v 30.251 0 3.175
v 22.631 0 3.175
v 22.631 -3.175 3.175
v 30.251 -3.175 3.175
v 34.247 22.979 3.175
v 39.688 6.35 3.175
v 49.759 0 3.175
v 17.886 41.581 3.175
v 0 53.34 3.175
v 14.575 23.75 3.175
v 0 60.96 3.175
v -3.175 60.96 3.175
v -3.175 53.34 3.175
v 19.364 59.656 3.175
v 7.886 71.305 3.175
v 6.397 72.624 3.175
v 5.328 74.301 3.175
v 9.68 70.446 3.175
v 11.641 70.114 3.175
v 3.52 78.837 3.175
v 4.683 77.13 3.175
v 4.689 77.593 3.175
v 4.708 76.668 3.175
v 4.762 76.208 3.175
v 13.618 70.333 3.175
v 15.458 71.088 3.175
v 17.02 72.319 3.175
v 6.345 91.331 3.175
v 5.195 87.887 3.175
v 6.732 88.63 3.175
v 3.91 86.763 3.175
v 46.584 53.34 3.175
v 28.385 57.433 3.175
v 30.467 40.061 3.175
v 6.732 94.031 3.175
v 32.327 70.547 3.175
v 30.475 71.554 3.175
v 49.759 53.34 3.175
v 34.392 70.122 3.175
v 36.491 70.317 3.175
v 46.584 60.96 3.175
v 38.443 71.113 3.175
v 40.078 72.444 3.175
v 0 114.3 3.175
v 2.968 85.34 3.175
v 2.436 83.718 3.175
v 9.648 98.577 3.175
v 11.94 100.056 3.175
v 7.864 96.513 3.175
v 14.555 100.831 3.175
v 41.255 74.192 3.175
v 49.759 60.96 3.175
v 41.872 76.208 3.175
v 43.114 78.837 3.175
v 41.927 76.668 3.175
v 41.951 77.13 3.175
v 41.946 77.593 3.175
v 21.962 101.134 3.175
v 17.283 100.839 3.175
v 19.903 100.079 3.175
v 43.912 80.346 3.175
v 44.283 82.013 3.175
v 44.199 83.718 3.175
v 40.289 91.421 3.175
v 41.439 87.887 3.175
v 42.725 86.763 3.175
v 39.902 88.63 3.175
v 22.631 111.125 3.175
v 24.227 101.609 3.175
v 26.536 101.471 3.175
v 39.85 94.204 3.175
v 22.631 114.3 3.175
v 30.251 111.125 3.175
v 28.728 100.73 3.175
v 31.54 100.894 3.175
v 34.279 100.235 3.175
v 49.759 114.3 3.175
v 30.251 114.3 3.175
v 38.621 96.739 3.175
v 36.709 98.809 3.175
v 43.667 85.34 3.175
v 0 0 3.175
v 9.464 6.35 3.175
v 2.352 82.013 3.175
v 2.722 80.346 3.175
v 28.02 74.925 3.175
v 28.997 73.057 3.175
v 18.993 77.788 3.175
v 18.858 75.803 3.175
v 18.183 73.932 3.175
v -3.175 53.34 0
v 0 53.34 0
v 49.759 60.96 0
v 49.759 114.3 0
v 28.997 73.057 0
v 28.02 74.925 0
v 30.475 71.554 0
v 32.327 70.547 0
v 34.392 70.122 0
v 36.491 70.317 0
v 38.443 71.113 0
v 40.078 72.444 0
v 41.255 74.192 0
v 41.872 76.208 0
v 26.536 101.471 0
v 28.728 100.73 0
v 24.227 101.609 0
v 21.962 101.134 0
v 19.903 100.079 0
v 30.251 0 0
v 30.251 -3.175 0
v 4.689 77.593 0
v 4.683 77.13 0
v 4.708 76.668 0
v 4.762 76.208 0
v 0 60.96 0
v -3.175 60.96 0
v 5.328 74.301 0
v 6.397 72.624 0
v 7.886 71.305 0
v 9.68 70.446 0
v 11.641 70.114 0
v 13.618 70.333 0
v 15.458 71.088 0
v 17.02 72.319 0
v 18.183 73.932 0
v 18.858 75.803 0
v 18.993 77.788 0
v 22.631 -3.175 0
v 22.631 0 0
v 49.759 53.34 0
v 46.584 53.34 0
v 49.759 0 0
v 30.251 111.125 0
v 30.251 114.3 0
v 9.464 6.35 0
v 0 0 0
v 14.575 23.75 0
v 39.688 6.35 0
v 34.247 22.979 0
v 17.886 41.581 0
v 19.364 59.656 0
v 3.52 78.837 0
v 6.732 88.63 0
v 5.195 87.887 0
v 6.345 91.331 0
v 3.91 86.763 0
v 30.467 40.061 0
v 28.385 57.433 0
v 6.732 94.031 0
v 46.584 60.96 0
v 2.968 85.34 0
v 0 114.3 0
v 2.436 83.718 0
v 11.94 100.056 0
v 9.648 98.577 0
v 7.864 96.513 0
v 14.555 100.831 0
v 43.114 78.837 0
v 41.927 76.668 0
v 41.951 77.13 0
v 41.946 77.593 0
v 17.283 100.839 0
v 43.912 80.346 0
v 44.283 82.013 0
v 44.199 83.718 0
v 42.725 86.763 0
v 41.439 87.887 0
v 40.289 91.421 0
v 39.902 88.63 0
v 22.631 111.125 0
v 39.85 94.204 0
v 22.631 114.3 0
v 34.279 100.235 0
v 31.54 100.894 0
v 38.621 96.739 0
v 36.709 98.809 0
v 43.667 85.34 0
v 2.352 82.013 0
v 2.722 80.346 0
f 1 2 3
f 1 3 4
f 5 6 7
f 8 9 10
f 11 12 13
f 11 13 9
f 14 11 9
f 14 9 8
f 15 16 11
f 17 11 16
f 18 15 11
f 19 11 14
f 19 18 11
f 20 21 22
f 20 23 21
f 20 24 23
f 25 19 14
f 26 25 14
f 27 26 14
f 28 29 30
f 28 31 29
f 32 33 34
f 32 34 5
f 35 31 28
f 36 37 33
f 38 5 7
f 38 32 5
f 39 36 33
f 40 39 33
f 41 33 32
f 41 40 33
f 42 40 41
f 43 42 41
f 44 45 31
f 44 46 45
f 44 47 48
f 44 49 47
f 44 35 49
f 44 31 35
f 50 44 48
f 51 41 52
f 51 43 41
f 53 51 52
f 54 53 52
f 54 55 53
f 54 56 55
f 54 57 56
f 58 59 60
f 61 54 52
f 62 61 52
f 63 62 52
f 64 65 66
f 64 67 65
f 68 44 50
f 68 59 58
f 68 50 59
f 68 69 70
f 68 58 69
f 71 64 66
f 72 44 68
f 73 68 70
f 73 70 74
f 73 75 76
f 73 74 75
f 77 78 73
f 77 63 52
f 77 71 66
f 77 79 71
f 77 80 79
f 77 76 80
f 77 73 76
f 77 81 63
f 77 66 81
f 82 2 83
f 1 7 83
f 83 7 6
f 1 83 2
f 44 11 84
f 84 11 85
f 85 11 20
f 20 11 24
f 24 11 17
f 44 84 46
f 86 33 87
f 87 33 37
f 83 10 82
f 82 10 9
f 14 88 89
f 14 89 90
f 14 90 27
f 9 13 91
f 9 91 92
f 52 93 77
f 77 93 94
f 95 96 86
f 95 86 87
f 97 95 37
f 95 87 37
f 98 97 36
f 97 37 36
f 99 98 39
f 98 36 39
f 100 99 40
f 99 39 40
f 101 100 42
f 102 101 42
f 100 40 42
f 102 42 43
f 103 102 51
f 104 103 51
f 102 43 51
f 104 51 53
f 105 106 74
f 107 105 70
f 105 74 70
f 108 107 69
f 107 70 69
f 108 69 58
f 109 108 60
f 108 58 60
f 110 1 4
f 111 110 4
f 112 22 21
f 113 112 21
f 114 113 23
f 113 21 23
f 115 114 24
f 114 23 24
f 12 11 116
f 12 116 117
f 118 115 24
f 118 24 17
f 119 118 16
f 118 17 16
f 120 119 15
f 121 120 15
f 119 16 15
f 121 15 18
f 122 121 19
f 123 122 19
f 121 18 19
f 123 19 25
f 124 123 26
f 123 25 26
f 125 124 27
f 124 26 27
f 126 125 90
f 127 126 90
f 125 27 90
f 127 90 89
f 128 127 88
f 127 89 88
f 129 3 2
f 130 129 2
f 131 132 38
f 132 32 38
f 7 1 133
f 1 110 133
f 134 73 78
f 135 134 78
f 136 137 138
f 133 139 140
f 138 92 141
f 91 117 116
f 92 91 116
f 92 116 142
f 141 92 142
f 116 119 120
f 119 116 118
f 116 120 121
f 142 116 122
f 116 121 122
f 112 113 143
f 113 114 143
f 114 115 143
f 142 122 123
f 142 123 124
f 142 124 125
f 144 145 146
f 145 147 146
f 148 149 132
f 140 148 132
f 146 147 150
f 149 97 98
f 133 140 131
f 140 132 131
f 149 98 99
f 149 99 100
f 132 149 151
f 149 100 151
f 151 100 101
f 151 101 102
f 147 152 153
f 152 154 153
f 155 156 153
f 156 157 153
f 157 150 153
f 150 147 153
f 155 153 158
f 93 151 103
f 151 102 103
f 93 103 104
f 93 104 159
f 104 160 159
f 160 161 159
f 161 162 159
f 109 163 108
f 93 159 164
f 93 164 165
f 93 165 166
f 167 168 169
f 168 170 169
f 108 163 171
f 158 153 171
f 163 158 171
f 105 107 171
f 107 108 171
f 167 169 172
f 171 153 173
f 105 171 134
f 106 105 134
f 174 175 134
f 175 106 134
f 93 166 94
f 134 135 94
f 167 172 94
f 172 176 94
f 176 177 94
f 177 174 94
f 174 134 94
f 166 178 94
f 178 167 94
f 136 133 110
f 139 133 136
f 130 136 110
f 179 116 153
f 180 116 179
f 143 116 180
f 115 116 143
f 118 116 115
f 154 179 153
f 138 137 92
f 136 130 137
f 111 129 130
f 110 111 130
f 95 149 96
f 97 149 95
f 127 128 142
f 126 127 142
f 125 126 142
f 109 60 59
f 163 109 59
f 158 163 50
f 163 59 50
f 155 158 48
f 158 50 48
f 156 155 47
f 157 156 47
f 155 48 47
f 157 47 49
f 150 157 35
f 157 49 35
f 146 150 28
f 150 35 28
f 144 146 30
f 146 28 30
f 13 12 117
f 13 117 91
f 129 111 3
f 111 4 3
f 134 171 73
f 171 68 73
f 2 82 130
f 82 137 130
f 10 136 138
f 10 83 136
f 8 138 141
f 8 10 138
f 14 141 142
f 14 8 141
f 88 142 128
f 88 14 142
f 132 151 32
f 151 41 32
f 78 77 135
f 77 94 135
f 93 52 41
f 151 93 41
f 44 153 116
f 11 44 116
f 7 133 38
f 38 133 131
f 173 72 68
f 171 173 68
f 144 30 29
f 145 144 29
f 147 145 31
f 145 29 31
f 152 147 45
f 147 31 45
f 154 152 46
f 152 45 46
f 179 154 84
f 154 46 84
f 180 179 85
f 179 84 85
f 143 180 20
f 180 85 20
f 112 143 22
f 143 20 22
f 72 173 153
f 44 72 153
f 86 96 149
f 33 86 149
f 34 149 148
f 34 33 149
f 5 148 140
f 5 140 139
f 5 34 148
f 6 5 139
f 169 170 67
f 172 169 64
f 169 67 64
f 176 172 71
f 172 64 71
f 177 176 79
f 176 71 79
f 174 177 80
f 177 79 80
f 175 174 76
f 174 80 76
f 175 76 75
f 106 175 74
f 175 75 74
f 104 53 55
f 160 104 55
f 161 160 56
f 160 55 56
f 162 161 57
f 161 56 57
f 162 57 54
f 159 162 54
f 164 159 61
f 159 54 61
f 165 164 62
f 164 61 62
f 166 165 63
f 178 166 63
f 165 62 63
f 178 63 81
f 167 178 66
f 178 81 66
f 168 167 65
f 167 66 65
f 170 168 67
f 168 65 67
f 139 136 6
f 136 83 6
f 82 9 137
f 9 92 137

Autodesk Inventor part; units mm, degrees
ref_plane "YZ Plane" through (0, 0, 0) normal (1, 0, 0) x (0, 1, 0)
ref_plane "XZ Plane" through (0, 0, 0) normal (0, 1, 0) x (-1, 0, 0)
ref_plane "XY Plane" through (0, 0, 0) normal (0, 0, 1) x (1, 0, 0)
sketch "Sketch1" plane through (0, 0, 0) normal (0, 0, 1) x (1, 0, 0)
  line L0 (0, 0) -> (49.7586, 0)
  line L1 (49.7586, 0) -> (49.7586, 114.3)
  line L2 (49.7586, 114.3) -> (0, 114.3)
  line L3 (0, 114.3) -> (0, 0)
  dimension "d0" = 114.3
  dimension "d1" = 49.7586
extrude "Extrusion1" add sketch "Sketch1" along normal blind 3.175
sketch "Sketch2" plane through (0, 0, 3.175) normal (0, 0, 1) x (1, 0, 0)
  line L0 (0, 114.3) -> (0, 0) projected
  line L1 (49.7586, 0) -> (49.7586, 114.3) projected
  line L2 (0, 60.96) -> (-3.175, 60.96)
  line L3 (-3.175, 60.96) -> (-3.175, 53.34)
  line L4 (-3.175, 53.34) -> (0, 53.34)
  line L5 (0, 53.34) -> (0, 60.96)
  line L6 (49.7586, 60.96) -> (46.5836, 60.96)
  line L7 (46.5836, 60.96) -> (46.5836, 53.34)
  line L8 (46.5836, 53.34) -> (49.7586, 53.34)
  line L9 (49.7586, 53.34) -> (49.7586, 60.96)
  line L10 (49.7586, 114.3) -> (0, 114.3) projected
  line L11 (0, 0) -> (49.7586, 0) projected
  line L12 (30.2514, 114.3) -> (22.6314, 114.3)
  line L13 (30.2514, 0) -> (30.2514, -3.175)
  line L14 (30.2514, -3.175) -> (22.6314, -3.175)
  line L15 (22.6314, -3.175) -> (22.6314, 0)
  line L16 (22.6314, 0) -> (30.2514, 0)
  line L17 (22.6314, 114.3) -> (22.6314, 111.125)
  line L18 (22.6314, 111.125) -> (30.2514, 111.125)
  line L19 (30.2514, 111.125) -> (30.2514, 114.3)
  point P0 (0, 57.15)
  point P1 (49.7586, 57.15)
  point P2 (26.4414, 0)
  point P3 (26.4414, 114.3)
  dimension "d4" = 3.81
  dimension "d5" = 7.62
  dimension "d6" = 3.175
  dimension "d7" = 3.81
  dimension "d8" = 7.62
  dimension "d9" = 3.175
  dimension "d13" = 7.62
  dimension "d15" = 3.175
  dimension "d20" = 7.62
  dimension "d22" = 3.175
  dimension "d33" = 3.81
  dimension "d34" = 26.4414
  dimension "d35" = 26.4414
  dimension "d36" = 3.81
extrude "Extrusion2" add sketch "Sketch2" against normal blind 3.175 contours L0 L4 L3 L2 | L10 L19 L18 L17 | L11 L13 L14 L15 | L1 L8 L7 L6
extrude "Extrusion3" cut sketch "Sketch2" against normal blind 3.175 contours L10 L19 L18 L17 | L1 L8 L7 L6
sketch "Sketch3" plane through (0, 0, 3.175) normal (0, 0, 1) x (1, 0, 0)
  line L0 (0, 60.96) -> (0, 114.3)
  line L1 (22.6314, 114.3) -> (0, 114.3) projected
  line L2 (0, 114.3) -> (22.6314, 114.3)
  line L3 (22.6314, 114.3) -> (22.6314, 111.125)
  line L4 (22.6314, 111.125) -> (30.2514, 111.125)
  line L5 (30.2514, 111.125) -> (22.6314, 111.125) projected
  line L6 (30.2514, 111.125) -> (30.2514, 114.3)
  line L7 (30.2514, 114.3) -> (49.7586, 114.3)
  line L8 (49.7586, 114.3) -> (49.7586, 60.96)
  line L9 (49.7586, 60.96) -> (49.7586, 114.3) projected
  line L10 (49.7586, 60.96) -> (46.5836, 60.96)
  line L11 (46.5836, 60.96) -> (46.5836, 53.34)
  line L12 (46.5836, 60.96) -> (46.5836, 53.34) projected
  line L13 (46.5836, 53.34) -> (49.7586, 53.34)
  line L14 (49.7586, 53.34) -> (49.7586, 0)
  line L15 (49.7586, 0) -> (49.7586, 53.34) projected
  line L16 (49.7586, 0) -> (30.2514, 0)
  line L17 (0, 0) -> (22.6314, 0) projected
  line L18 (30.2514, 0) -> (30.2514, -3.175)
  line L19 (30.2514, -3.175) -> (22.6314, -3.175)
  line L20 (22.6314, -3.175) -> (30.2514, -3.175) projected
  line L21 (22.6314, -3.175) -> (22.6314, 0)
  line L22 (22.6314, 0) -> (0, 0)
  line L23 (0, 0) -> (0, 53.34)
  line L24 (0, 53.34) -> (0, 0) projected
  line L25 (0, 53.34) -> (-3.175, 53.34)
  line L26 (-3.175, 53.34) -> (-3.175, 60.96)
  line L27 (-3.175, 60.96) -> (-3.175, 53.34) projected
  line L28 (-3.175, 60.96) -> (0, 60.96)
sketch "Sketch4" plane through (0, 0, 3.175) normal (0, 0, 1) x (1, 0, 0)
  arc A0 (9.4645, 6.35) -> (18.9927, 77.7875) centre (-158.3531, 65.0875) ccw
  arc A1 (28.1243, 77.7875) -> (39.6875, 6.35) centre (205.7485, 69.884) ccw
  line L0 (0, 0) -> (22.6314, 0) projected
  line L1 (30.2514, 0) -> (49.7586, 0) projected
  line L2 (9.4645, 6.35) -> (39.6875, 6.35)
  arc A2 (4.7619, 76.2078) -> (18.9927, 77.7875) centre (11.8465, 77.2757) ccw
  arc A3 (6.7319, 88.6305) -> (4.6889, 77.5927) centre (8.7235, 82.5539) ccw
  arc A4 (4.6889, 77.5927) -> (4.7619, 76.2078) centre (11.8465, 77.2757) ccw
  arc A5 (19.9033, 100.0791) -> (6.7319, 88.6305) centre (15.9469, 91.3299) ccw
  line L3 (23.3172, 114.3) -> (23.3172, 47.625) construction
  line L4 (49.7586, 60.96) -> (49.7586, 114.3) projected
  arc A6 (28.02, 74.925) -> (41.8725, 76.2078) centre (34.7879, 77.2757) ccw
  arc A7 (41.9455, 77.5927) -> (39.9025, 88.6305) centre (37.9109, 82.5539) ccw
  arc A8 (41.8725, 76.2078) -> (41.9455, 77.5927) centre (34.7879, 77.2757) ccw
  arc A9 (39.9025, 88.6305) -> (28.7277, 100.7299) centre (30.6875, 91.3299) ccw
  arc A10 (28.7277, 100.7299) -> (19.9033, 100.0791) centre (24.8672, 92.9247) ccw
  point P0 (21.8385, 98.9122)
  point P1 (27.6417, 77.7875)
  point P2 (24.7959, 98.9122)
  dimension "d23" = 71.4375
  dimension "d24" = 6.35
  dimension "d25" = 177.8
  dimension "d26" = 6.35
  dimension "d28" = 177.8
  dimension "d29" = 26.4414
  dimension "d30" = 71.4375
extrude "Extrusion4" cut sketch "Sketch4" against normal blind 25.4
properties part number "Birdhouse Wall 2" material "Wood (Birch)"
